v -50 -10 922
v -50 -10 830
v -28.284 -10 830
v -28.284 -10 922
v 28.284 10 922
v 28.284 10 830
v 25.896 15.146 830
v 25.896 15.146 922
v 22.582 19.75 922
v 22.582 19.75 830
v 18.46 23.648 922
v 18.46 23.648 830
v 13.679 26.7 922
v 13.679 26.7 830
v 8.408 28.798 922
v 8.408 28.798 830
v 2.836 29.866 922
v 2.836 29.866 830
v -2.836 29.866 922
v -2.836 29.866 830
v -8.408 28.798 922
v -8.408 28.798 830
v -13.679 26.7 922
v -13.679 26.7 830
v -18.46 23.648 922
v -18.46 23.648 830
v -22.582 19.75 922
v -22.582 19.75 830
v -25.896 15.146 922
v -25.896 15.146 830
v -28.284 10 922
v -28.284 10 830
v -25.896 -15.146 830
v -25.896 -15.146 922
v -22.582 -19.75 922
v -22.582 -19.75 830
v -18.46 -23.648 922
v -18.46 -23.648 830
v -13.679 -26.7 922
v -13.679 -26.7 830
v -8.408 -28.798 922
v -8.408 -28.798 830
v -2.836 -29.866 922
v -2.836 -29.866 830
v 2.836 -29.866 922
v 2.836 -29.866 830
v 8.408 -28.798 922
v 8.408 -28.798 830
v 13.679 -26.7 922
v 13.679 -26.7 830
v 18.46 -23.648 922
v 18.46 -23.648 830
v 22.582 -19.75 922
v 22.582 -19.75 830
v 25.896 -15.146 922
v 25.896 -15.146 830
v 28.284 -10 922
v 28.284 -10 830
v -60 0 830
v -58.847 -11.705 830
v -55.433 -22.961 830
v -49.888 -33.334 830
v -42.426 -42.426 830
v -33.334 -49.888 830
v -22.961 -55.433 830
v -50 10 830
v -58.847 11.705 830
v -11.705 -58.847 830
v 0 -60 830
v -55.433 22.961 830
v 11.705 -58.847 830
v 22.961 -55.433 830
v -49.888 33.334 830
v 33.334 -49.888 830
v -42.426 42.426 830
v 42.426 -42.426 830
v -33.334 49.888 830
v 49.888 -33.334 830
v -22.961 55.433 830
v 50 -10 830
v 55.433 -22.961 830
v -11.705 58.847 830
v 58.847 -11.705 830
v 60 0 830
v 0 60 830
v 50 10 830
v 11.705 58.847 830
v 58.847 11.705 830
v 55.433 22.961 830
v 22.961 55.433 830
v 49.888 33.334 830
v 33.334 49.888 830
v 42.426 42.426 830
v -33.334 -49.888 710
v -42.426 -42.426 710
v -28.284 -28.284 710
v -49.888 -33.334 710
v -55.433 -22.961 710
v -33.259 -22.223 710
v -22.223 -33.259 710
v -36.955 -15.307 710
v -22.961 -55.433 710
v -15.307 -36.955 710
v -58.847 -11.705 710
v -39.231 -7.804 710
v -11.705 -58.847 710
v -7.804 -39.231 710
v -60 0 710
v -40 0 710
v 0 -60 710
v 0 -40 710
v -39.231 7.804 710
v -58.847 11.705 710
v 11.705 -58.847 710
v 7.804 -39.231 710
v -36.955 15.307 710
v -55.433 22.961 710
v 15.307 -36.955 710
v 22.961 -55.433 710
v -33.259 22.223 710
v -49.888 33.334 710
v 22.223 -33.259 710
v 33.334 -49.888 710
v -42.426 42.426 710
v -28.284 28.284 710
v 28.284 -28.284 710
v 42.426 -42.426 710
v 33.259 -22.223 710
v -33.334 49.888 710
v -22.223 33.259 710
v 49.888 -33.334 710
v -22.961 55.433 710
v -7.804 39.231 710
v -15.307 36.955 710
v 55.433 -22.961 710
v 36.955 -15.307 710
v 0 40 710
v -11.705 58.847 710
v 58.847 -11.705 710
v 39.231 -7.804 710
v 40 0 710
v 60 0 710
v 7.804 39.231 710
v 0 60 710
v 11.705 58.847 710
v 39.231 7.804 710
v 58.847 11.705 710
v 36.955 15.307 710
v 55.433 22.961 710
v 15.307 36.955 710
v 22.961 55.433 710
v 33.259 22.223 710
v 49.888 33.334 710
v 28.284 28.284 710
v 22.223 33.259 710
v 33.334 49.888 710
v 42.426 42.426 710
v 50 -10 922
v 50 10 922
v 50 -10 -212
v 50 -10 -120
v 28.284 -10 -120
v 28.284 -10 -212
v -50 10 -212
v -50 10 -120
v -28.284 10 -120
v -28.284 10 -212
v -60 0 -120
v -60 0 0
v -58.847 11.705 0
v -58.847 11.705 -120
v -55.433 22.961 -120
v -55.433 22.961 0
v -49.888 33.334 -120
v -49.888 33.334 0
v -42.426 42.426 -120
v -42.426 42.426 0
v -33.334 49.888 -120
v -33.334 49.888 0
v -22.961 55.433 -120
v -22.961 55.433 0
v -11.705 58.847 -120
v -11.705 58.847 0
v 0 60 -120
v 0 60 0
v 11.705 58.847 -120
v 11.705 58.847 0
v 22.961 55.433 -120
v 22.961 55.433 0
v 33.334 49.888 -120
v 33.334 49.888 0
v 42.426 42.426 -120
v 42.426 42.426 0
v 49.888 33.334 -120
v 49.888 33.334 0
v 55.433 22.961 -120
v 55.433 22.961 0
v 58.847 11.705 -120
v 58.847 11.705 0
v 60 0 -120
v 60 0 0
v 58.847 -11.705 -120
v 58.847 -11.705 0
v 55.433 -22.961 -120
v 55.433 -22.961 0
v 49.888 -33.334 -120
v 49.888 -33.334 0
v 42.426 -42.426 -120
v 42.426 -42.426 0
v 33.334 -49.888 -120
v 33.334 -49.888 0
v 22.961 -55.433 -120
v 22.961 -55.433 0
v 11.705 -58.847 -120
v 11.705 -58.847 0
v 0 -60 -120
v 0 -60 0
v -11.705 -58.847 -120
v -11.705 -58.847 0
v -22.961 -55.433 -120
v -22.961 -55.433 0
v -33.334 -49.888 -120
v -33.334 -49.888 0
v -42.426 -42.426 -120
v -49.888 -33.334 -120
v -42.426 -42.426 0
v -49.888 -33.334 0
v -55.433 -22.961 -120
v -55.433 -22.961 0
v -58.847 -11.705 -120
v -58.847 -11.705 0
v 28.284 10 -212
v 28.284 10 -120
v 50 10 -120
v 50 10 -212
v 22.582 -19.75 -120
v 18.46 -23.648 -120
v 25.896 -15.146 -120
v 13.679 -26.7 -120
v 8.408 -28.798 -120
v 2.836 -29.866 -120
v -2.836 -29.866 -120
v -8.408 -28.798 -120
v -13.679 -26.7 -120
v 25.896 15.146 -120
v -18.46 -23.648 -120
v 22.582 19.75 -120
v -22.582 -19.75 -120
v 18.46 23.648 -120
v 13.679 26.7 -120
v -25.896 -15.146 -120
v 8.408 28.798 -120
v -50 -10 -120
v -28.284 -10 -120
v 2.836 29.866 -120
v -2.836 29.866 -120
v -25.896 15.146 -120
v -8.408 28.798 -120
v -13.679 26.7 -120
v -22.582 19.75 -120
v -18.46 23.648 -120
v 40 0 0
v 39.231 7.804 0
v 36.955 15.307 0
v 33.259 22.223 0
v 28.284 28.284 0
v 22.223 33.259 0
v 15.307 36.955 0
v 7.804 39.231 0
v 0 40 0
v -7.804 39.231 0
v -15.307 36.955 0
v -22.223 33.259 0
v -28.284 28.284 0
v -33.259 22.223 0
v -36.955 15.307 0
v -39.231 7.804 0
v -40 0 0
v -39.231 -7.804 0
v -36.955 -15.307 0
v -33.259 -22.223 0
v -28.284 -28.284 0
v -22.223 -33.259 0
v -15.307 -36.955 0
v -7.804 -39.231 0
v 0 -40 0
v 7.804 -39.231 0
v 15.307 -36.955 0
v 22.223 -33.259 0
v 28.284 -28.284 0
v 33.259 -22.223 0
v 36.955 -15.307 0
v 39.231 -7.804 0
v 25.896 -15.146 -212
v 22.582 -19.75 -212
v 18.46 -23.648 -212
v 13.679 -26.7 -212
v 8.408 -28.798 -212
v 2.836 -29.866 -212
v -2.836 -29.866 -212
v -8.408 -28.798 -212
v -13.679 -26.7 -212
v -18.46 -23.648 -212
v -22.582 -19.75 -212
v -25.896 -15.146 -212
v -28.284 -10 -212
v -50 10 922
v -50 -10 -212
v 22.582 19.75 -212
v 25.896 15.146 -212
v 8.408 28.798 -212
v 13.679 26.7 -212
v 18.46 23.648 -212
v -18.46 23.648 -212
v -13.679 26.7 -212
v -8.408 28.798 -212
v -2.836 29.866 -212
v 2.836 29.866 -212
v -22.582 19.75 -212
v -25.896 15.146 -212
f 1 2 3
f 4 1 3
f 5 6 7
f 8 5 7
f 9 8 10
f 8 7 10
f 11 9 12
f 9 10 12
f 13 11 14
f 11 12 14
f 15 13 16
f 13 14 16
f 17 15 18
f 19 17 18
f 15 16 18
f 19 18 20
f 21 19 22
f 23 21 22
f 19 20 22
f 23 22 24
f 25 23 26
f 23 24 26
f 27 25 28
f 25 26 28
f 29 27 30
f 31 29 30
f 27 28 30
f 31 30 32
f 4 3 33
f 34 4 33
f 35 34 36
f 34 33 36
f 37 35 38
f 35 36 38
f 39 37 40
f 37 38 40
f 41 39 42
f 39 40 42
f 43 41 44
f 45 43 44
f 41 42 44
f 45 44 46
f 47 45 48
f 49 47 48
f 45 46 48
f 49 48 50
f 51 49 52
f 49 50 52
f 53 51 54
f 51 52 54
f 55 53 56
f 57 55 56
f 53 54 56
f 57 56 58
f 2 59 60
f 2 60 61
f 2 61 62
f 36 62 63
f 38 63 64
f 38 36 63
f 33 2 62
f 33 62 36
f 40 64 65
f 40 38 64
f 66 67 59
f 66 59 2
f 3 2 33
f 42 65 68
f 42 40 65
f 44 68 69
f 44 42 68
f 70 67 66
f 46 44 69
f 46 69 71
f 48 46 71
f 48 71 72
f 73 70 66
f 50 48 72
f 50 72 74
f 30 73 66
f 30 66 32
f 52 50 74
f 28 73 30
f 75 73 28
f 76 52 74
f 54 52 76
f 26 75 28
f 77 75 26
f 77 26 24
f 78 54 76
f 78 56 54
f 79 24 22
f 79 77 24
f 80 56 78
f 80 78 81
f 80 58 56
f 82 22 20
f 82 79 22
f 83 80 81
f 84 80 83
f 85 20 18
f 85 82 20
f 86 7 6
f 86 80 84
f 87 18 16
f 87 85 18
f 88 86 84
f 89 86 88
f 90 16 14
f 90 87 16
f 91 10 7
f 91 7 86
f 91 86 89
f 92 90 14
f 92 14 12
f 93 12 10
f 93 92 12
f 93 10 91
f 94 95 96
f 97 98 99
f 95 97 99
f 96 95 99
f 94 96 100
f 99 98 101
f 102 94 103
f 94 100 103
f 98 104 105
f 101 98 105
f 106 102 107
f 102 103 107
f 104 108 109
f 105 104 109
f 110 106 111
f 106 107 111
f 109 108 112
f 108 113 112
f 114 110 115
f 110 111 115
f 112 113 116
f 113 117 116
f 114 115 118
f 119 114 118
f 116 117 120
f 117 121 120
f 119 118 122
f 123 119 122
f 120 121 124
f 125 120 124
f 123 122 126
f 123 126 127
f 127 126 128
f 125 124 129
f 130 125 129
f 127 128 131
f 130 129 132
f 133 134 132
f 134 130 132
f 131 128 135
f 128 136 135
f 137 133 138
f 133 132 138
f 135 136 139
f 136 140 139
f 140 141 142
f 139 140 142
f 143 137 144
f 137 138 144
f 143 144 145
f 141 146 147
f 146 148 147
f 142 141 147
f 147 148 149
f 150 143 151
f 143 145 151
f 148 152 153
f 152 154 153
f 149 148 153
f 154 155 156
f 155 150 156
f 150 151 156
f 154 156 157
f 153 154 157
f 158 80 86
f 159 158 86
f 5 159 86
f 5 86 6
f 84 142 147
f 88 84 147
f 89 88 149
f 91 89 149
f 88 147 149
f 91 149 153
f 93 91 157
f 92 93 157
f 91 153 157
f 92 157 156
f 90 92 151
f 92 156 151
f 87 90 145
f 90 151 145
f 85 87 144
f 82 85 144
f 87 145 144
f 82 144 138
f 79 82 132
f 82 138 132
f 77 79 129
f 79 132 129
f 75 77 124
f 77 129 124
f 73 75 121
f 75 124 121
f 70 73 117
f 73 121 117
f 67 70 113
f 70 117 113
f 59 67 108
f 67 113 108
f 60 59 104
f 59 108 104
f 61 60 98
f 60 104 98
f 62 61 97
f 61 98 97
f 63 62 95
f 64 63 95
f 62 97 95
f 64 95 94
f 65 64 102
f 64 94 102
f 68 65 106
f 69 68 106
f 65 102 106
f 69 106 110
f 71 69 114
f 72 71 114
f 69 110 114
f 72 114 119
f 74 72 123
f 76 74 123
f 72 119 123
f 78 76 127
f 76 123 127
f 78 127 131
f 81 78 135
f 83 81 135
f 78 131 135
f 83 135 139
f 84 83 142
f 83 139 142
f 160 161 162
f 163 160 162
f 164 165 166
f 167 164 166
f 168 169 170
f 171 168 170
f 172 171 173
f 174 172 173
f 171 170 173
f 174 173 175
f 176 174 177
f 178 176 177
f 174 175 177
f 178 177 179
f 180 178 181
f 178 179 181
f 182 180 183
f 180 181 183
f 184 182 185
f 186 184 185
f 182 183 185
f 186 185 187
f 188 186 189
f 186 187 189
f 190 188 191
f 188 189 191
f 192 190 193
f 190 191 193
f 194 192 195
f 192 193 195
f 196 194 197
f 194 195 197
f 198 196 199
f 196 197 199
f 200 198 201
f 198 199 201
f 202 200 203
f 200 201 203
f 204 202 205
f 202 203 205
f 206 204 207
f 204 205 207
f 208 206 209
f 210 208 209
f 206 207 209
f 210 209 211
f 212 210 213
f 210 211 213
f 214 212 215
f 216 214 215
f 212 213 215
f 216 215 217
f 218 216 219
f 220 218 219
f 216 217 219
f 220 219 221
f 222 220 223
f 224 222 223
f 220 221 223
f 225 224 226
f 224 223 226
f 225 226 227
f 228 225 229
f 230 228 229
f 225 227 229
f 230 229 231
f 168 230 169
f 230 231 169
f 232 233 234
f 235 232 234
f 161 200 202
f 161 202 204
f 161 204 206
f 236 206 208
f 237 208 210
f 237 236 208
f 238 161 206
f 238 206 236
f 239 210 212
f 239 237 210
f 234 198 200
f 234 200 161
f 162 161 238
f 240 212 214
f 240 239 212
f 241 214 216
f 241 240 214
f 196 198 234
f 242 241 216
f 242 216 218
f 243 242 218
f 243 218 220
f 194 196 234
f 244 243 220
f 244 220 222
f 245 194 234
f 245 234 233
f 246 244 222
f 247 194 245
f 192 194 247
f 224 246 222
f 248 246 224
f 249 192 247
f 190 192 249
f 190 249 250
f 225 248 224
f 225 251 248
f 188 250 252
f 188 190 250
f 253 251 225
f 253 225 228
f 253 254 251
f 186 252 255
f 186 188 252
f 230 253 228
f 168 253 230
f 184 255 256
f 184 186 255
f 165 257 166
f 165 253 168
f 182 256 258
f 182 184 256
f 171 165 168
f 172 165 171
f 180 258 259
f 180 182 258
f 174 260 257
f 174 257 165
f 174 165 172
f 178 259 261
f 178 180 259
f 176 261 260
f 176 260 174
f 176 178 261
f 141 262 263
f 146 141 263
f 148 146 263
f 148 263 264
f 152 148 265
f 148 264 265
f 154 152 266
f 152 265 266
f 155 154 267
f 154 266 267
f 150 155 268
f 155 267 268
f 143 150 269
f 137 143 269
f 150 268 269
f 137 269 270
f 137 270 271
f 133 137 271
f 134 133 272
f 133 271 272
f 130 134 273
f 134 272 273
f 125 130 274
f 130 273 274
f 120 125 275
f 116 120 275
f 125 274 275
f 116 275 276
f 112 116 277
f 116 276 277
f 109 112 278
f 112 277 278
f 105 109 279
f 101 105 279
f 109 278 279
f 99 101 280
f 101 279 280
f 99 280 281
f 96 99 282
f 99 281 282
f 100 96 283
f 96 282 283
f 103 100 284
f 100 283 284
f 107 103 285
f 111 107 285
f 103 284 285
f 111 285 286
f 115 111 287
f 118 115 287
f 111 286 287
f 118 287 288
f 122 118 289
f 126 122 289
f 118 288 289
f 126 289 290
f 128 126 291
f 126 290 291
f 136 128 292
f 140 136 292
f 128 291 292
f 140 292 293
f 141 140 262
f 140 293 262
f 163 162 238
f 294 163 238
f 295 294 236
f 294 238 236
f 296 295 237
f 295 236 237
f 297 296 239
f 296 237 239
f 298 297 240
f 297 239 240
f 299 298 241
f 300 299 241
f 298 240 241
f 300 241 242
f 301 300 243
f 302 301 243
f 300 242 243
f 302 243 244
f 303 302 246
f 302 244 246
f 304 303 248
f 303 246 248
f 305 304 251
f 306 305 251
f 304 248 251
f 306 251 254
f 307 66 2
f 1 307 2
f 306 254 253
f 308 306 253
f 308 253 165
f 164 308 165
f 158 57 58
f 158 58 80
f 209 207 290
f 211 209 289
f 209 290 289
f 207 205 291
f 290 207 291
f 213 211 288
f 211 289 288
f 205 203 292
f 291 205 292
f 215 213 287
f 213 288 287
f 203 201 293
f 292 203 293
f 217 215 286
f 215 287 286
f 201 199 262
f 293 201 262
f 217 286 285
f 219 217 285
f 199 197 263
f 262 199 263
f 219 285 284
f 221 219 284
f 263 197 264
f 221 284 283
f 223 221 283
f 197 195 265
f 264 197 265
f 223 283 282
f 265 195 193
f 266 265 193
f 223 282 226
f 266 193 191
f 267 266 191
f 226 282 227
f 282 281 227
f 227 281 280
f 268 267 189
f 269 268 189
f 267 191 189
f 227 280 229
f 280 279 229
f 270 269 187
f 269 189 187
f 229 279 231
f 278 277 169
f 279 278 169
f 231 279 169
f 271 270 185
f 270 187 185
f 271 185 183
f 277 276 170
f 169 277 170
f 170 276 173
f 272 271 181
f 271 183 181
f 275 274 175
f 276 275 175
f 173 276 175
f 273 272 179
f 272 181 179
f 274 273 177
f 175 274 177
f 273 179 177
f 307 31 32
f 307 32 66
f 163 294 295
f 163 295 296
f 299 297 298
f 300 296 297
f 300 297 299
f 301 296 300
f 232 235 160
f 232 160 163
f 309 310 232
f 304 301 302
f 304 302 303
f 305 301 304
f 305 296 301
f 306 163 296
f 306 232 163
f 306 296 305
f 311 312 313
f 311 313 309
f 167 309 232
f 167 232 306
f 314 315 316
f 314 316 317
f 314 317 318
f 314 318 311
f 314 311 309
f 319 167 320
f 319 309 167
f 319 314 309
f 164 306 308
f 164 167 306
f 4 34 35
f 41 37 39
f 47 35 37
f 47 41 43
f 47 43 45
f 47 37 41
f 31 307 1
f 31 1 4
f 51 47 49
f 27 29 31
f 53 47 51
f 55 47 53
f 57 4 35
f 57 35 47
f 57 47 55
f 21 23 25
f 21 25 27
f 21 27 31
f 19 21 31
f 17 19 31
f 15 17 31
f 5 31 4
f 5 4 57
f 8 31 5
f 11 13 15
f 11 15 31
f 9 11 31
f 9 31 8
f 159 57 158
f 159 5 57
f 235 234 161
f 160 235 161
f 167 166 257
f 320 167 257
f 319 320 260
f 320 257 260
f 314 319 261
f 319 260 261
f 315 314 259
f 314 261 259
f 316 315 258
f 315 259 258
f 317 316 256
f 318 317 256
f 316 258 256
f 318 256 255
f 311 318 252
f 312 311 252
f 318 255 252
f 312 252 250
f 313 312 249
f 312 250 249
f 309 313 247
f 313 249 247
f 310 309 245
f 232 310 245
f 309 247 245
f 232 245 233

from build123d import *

# Parameters (mm, degrees)
SKETCH1_R           = 40
BOSS_EXTRUDE1_DEPTH = 710
SKETCH2_R           = 60
BOSS_EXTRUDE2_DEPTH = 120
SKETCH3_R           = 60
BOSS_EXTRUDE3_DEPTH = 120
BOSS_EXTRUDE4_DEPTH = 92
BOSS_EXTRUDE5_DEPTH = 92


with BuildPart() as part:
    # Sketch1 → Boss-Extrude1 (new body)
    with BuildSketch(Plane.XY):
        Circle(SKETCH1_R)
    extrude(amount=BOSS_EXTRUDE1_DEPTH)

    # Sketch2 → Boss-Extrude2 (add)
    with BuildSketch(Plane.XY.offset(710)):
        Circle(SKETCH2_R)
    extrude(amount=BOSS_EXTRUDE2_DEPTH)

    # Sketch3 → Boss-Extrude3 (add)
    with BuildSketch(Plane(origin=(0, 0, 0), x_dir=(-1, 0, 0), z_dir=(0, 0, -1))):
        Circle(SKETCH3_R)
    extrude(amount=BOSS_EXTRUDE3_DEPTH)

    # Sketch4 → Boss-Extrude4 (add)
    with BuildSketch(Plane.XY.offset(830)):
        with BuildLine():
            Line((-28.284271247, 10), (-50, 10))
            Line((-50, 10), (-50, -10))
            Line((-50, -10), (-28.284271247, -10))
            ThreePointArc((-28.284271247, -10), (-30, 0), (-28.284271247, 10))
        make_face()
        with BuildLine():
            ThreePointArc((28.284271247, 10), (0, 30), (-28.284271247, 10))
            Line((-28.284271247, 10), (28.284271247, 10))
        make_face()
        with BuildLine():
            Line((28.284271247, 10), (-28.284271247, 10))
            ThreePointArc((-28.284271247, 10), (-30, 0), (-28.284271247, -10))
            Line((-28.284271247, -10), (28.284271247, -10))
            ThreePointArc((28.284271247, -10), (29.56795679, -5.073059362), (30, 0))
            ThreePointArc((30, 0), (29.56795679, 5.073059362), (28.284271247, 10))
        make_face()
        with BuildLine():
            Line((28.284271247, -10), (-28.284271247, -10))
            ThreePointArc((-28.284271247, -10), (0, -30), (28.284271247, -10))
        make_face()
        with BuildLine():
            Line((50, 10), (28.284271247, 10))
            ThreePointArc((28.284271247, 10), (29.56795679, 5.073059362), (30, 0))
            ThreePointArc((30, 0), (29.56795679, -5.073059362), (28.284271247, -10))
            Line((28.284271247, -10), (50, -10))
            Line((50, -10), (50, 10))
        make_face()
    extrude(amount=BOSS_EXTRUDE4_DEPTH)

    # Sketch5 → Boss-Extrude5 (add)
    with BuildSketch(Plane(origin=(0, 0, -120), x_dir=(-1, 0, 0), z_dir=(0, 0, -1))):
        with BuildLine():
            Line((-28.284271247, 10), (28.284271247, 10))
            ThreePointArc((28.284271247, 10), (0, 30), (-28.284271247, 10))
        make_face()
        with BuildLine():
            Line((-50, -10), (-28.284271247, -10))
            ThreePointArc((-28.284271247, -10), (-30, 0), (-28.284271247, 10))
            Line((-28.284271247, 10), (-50, 10))
            Line((-50, 10), (-50, -10))
        make_face()
        with BuildLine():
            Line((-28.284271247, -10), (28.284271247, -10))
            ThreePointArc((28.284271247, -10), (29.56795679, -5.073059362), (30, 0))
            ThreePointArc((30, 0), (29.56795679, 5.073059362), (28.284271247, 10))
            Line((28.284271247, 10), (-28.284271247, 10))
            ThreePointArc((-28.284271247, 10), (-30, 0), (-28.284271247, -10))
        make_face()
        with BuildLine():
            ThreePointArc((-28.284271247, -10), (0, -30), (28.284271247, -10))
            Line((28.284271247, -10), (-28.284271247, -10))
        make_face()
        with BuildLine():
            Line((28.284271247, -10), (50, -10))
            Line((50, -10), (50, 10))
            Line((50, 10), (28.284271247, 10))
            ThreePointArc((28.284271247, 10), (29.56795679, 5.073059362), (30, 0))
            ThreePointArc((30, 0), (29.56795679, -5.073059362), (28.284271247, -10))
        make_face()
    extrude(amount=BOSS_EXTRUDE5_DEPTH)


solid = part.part
